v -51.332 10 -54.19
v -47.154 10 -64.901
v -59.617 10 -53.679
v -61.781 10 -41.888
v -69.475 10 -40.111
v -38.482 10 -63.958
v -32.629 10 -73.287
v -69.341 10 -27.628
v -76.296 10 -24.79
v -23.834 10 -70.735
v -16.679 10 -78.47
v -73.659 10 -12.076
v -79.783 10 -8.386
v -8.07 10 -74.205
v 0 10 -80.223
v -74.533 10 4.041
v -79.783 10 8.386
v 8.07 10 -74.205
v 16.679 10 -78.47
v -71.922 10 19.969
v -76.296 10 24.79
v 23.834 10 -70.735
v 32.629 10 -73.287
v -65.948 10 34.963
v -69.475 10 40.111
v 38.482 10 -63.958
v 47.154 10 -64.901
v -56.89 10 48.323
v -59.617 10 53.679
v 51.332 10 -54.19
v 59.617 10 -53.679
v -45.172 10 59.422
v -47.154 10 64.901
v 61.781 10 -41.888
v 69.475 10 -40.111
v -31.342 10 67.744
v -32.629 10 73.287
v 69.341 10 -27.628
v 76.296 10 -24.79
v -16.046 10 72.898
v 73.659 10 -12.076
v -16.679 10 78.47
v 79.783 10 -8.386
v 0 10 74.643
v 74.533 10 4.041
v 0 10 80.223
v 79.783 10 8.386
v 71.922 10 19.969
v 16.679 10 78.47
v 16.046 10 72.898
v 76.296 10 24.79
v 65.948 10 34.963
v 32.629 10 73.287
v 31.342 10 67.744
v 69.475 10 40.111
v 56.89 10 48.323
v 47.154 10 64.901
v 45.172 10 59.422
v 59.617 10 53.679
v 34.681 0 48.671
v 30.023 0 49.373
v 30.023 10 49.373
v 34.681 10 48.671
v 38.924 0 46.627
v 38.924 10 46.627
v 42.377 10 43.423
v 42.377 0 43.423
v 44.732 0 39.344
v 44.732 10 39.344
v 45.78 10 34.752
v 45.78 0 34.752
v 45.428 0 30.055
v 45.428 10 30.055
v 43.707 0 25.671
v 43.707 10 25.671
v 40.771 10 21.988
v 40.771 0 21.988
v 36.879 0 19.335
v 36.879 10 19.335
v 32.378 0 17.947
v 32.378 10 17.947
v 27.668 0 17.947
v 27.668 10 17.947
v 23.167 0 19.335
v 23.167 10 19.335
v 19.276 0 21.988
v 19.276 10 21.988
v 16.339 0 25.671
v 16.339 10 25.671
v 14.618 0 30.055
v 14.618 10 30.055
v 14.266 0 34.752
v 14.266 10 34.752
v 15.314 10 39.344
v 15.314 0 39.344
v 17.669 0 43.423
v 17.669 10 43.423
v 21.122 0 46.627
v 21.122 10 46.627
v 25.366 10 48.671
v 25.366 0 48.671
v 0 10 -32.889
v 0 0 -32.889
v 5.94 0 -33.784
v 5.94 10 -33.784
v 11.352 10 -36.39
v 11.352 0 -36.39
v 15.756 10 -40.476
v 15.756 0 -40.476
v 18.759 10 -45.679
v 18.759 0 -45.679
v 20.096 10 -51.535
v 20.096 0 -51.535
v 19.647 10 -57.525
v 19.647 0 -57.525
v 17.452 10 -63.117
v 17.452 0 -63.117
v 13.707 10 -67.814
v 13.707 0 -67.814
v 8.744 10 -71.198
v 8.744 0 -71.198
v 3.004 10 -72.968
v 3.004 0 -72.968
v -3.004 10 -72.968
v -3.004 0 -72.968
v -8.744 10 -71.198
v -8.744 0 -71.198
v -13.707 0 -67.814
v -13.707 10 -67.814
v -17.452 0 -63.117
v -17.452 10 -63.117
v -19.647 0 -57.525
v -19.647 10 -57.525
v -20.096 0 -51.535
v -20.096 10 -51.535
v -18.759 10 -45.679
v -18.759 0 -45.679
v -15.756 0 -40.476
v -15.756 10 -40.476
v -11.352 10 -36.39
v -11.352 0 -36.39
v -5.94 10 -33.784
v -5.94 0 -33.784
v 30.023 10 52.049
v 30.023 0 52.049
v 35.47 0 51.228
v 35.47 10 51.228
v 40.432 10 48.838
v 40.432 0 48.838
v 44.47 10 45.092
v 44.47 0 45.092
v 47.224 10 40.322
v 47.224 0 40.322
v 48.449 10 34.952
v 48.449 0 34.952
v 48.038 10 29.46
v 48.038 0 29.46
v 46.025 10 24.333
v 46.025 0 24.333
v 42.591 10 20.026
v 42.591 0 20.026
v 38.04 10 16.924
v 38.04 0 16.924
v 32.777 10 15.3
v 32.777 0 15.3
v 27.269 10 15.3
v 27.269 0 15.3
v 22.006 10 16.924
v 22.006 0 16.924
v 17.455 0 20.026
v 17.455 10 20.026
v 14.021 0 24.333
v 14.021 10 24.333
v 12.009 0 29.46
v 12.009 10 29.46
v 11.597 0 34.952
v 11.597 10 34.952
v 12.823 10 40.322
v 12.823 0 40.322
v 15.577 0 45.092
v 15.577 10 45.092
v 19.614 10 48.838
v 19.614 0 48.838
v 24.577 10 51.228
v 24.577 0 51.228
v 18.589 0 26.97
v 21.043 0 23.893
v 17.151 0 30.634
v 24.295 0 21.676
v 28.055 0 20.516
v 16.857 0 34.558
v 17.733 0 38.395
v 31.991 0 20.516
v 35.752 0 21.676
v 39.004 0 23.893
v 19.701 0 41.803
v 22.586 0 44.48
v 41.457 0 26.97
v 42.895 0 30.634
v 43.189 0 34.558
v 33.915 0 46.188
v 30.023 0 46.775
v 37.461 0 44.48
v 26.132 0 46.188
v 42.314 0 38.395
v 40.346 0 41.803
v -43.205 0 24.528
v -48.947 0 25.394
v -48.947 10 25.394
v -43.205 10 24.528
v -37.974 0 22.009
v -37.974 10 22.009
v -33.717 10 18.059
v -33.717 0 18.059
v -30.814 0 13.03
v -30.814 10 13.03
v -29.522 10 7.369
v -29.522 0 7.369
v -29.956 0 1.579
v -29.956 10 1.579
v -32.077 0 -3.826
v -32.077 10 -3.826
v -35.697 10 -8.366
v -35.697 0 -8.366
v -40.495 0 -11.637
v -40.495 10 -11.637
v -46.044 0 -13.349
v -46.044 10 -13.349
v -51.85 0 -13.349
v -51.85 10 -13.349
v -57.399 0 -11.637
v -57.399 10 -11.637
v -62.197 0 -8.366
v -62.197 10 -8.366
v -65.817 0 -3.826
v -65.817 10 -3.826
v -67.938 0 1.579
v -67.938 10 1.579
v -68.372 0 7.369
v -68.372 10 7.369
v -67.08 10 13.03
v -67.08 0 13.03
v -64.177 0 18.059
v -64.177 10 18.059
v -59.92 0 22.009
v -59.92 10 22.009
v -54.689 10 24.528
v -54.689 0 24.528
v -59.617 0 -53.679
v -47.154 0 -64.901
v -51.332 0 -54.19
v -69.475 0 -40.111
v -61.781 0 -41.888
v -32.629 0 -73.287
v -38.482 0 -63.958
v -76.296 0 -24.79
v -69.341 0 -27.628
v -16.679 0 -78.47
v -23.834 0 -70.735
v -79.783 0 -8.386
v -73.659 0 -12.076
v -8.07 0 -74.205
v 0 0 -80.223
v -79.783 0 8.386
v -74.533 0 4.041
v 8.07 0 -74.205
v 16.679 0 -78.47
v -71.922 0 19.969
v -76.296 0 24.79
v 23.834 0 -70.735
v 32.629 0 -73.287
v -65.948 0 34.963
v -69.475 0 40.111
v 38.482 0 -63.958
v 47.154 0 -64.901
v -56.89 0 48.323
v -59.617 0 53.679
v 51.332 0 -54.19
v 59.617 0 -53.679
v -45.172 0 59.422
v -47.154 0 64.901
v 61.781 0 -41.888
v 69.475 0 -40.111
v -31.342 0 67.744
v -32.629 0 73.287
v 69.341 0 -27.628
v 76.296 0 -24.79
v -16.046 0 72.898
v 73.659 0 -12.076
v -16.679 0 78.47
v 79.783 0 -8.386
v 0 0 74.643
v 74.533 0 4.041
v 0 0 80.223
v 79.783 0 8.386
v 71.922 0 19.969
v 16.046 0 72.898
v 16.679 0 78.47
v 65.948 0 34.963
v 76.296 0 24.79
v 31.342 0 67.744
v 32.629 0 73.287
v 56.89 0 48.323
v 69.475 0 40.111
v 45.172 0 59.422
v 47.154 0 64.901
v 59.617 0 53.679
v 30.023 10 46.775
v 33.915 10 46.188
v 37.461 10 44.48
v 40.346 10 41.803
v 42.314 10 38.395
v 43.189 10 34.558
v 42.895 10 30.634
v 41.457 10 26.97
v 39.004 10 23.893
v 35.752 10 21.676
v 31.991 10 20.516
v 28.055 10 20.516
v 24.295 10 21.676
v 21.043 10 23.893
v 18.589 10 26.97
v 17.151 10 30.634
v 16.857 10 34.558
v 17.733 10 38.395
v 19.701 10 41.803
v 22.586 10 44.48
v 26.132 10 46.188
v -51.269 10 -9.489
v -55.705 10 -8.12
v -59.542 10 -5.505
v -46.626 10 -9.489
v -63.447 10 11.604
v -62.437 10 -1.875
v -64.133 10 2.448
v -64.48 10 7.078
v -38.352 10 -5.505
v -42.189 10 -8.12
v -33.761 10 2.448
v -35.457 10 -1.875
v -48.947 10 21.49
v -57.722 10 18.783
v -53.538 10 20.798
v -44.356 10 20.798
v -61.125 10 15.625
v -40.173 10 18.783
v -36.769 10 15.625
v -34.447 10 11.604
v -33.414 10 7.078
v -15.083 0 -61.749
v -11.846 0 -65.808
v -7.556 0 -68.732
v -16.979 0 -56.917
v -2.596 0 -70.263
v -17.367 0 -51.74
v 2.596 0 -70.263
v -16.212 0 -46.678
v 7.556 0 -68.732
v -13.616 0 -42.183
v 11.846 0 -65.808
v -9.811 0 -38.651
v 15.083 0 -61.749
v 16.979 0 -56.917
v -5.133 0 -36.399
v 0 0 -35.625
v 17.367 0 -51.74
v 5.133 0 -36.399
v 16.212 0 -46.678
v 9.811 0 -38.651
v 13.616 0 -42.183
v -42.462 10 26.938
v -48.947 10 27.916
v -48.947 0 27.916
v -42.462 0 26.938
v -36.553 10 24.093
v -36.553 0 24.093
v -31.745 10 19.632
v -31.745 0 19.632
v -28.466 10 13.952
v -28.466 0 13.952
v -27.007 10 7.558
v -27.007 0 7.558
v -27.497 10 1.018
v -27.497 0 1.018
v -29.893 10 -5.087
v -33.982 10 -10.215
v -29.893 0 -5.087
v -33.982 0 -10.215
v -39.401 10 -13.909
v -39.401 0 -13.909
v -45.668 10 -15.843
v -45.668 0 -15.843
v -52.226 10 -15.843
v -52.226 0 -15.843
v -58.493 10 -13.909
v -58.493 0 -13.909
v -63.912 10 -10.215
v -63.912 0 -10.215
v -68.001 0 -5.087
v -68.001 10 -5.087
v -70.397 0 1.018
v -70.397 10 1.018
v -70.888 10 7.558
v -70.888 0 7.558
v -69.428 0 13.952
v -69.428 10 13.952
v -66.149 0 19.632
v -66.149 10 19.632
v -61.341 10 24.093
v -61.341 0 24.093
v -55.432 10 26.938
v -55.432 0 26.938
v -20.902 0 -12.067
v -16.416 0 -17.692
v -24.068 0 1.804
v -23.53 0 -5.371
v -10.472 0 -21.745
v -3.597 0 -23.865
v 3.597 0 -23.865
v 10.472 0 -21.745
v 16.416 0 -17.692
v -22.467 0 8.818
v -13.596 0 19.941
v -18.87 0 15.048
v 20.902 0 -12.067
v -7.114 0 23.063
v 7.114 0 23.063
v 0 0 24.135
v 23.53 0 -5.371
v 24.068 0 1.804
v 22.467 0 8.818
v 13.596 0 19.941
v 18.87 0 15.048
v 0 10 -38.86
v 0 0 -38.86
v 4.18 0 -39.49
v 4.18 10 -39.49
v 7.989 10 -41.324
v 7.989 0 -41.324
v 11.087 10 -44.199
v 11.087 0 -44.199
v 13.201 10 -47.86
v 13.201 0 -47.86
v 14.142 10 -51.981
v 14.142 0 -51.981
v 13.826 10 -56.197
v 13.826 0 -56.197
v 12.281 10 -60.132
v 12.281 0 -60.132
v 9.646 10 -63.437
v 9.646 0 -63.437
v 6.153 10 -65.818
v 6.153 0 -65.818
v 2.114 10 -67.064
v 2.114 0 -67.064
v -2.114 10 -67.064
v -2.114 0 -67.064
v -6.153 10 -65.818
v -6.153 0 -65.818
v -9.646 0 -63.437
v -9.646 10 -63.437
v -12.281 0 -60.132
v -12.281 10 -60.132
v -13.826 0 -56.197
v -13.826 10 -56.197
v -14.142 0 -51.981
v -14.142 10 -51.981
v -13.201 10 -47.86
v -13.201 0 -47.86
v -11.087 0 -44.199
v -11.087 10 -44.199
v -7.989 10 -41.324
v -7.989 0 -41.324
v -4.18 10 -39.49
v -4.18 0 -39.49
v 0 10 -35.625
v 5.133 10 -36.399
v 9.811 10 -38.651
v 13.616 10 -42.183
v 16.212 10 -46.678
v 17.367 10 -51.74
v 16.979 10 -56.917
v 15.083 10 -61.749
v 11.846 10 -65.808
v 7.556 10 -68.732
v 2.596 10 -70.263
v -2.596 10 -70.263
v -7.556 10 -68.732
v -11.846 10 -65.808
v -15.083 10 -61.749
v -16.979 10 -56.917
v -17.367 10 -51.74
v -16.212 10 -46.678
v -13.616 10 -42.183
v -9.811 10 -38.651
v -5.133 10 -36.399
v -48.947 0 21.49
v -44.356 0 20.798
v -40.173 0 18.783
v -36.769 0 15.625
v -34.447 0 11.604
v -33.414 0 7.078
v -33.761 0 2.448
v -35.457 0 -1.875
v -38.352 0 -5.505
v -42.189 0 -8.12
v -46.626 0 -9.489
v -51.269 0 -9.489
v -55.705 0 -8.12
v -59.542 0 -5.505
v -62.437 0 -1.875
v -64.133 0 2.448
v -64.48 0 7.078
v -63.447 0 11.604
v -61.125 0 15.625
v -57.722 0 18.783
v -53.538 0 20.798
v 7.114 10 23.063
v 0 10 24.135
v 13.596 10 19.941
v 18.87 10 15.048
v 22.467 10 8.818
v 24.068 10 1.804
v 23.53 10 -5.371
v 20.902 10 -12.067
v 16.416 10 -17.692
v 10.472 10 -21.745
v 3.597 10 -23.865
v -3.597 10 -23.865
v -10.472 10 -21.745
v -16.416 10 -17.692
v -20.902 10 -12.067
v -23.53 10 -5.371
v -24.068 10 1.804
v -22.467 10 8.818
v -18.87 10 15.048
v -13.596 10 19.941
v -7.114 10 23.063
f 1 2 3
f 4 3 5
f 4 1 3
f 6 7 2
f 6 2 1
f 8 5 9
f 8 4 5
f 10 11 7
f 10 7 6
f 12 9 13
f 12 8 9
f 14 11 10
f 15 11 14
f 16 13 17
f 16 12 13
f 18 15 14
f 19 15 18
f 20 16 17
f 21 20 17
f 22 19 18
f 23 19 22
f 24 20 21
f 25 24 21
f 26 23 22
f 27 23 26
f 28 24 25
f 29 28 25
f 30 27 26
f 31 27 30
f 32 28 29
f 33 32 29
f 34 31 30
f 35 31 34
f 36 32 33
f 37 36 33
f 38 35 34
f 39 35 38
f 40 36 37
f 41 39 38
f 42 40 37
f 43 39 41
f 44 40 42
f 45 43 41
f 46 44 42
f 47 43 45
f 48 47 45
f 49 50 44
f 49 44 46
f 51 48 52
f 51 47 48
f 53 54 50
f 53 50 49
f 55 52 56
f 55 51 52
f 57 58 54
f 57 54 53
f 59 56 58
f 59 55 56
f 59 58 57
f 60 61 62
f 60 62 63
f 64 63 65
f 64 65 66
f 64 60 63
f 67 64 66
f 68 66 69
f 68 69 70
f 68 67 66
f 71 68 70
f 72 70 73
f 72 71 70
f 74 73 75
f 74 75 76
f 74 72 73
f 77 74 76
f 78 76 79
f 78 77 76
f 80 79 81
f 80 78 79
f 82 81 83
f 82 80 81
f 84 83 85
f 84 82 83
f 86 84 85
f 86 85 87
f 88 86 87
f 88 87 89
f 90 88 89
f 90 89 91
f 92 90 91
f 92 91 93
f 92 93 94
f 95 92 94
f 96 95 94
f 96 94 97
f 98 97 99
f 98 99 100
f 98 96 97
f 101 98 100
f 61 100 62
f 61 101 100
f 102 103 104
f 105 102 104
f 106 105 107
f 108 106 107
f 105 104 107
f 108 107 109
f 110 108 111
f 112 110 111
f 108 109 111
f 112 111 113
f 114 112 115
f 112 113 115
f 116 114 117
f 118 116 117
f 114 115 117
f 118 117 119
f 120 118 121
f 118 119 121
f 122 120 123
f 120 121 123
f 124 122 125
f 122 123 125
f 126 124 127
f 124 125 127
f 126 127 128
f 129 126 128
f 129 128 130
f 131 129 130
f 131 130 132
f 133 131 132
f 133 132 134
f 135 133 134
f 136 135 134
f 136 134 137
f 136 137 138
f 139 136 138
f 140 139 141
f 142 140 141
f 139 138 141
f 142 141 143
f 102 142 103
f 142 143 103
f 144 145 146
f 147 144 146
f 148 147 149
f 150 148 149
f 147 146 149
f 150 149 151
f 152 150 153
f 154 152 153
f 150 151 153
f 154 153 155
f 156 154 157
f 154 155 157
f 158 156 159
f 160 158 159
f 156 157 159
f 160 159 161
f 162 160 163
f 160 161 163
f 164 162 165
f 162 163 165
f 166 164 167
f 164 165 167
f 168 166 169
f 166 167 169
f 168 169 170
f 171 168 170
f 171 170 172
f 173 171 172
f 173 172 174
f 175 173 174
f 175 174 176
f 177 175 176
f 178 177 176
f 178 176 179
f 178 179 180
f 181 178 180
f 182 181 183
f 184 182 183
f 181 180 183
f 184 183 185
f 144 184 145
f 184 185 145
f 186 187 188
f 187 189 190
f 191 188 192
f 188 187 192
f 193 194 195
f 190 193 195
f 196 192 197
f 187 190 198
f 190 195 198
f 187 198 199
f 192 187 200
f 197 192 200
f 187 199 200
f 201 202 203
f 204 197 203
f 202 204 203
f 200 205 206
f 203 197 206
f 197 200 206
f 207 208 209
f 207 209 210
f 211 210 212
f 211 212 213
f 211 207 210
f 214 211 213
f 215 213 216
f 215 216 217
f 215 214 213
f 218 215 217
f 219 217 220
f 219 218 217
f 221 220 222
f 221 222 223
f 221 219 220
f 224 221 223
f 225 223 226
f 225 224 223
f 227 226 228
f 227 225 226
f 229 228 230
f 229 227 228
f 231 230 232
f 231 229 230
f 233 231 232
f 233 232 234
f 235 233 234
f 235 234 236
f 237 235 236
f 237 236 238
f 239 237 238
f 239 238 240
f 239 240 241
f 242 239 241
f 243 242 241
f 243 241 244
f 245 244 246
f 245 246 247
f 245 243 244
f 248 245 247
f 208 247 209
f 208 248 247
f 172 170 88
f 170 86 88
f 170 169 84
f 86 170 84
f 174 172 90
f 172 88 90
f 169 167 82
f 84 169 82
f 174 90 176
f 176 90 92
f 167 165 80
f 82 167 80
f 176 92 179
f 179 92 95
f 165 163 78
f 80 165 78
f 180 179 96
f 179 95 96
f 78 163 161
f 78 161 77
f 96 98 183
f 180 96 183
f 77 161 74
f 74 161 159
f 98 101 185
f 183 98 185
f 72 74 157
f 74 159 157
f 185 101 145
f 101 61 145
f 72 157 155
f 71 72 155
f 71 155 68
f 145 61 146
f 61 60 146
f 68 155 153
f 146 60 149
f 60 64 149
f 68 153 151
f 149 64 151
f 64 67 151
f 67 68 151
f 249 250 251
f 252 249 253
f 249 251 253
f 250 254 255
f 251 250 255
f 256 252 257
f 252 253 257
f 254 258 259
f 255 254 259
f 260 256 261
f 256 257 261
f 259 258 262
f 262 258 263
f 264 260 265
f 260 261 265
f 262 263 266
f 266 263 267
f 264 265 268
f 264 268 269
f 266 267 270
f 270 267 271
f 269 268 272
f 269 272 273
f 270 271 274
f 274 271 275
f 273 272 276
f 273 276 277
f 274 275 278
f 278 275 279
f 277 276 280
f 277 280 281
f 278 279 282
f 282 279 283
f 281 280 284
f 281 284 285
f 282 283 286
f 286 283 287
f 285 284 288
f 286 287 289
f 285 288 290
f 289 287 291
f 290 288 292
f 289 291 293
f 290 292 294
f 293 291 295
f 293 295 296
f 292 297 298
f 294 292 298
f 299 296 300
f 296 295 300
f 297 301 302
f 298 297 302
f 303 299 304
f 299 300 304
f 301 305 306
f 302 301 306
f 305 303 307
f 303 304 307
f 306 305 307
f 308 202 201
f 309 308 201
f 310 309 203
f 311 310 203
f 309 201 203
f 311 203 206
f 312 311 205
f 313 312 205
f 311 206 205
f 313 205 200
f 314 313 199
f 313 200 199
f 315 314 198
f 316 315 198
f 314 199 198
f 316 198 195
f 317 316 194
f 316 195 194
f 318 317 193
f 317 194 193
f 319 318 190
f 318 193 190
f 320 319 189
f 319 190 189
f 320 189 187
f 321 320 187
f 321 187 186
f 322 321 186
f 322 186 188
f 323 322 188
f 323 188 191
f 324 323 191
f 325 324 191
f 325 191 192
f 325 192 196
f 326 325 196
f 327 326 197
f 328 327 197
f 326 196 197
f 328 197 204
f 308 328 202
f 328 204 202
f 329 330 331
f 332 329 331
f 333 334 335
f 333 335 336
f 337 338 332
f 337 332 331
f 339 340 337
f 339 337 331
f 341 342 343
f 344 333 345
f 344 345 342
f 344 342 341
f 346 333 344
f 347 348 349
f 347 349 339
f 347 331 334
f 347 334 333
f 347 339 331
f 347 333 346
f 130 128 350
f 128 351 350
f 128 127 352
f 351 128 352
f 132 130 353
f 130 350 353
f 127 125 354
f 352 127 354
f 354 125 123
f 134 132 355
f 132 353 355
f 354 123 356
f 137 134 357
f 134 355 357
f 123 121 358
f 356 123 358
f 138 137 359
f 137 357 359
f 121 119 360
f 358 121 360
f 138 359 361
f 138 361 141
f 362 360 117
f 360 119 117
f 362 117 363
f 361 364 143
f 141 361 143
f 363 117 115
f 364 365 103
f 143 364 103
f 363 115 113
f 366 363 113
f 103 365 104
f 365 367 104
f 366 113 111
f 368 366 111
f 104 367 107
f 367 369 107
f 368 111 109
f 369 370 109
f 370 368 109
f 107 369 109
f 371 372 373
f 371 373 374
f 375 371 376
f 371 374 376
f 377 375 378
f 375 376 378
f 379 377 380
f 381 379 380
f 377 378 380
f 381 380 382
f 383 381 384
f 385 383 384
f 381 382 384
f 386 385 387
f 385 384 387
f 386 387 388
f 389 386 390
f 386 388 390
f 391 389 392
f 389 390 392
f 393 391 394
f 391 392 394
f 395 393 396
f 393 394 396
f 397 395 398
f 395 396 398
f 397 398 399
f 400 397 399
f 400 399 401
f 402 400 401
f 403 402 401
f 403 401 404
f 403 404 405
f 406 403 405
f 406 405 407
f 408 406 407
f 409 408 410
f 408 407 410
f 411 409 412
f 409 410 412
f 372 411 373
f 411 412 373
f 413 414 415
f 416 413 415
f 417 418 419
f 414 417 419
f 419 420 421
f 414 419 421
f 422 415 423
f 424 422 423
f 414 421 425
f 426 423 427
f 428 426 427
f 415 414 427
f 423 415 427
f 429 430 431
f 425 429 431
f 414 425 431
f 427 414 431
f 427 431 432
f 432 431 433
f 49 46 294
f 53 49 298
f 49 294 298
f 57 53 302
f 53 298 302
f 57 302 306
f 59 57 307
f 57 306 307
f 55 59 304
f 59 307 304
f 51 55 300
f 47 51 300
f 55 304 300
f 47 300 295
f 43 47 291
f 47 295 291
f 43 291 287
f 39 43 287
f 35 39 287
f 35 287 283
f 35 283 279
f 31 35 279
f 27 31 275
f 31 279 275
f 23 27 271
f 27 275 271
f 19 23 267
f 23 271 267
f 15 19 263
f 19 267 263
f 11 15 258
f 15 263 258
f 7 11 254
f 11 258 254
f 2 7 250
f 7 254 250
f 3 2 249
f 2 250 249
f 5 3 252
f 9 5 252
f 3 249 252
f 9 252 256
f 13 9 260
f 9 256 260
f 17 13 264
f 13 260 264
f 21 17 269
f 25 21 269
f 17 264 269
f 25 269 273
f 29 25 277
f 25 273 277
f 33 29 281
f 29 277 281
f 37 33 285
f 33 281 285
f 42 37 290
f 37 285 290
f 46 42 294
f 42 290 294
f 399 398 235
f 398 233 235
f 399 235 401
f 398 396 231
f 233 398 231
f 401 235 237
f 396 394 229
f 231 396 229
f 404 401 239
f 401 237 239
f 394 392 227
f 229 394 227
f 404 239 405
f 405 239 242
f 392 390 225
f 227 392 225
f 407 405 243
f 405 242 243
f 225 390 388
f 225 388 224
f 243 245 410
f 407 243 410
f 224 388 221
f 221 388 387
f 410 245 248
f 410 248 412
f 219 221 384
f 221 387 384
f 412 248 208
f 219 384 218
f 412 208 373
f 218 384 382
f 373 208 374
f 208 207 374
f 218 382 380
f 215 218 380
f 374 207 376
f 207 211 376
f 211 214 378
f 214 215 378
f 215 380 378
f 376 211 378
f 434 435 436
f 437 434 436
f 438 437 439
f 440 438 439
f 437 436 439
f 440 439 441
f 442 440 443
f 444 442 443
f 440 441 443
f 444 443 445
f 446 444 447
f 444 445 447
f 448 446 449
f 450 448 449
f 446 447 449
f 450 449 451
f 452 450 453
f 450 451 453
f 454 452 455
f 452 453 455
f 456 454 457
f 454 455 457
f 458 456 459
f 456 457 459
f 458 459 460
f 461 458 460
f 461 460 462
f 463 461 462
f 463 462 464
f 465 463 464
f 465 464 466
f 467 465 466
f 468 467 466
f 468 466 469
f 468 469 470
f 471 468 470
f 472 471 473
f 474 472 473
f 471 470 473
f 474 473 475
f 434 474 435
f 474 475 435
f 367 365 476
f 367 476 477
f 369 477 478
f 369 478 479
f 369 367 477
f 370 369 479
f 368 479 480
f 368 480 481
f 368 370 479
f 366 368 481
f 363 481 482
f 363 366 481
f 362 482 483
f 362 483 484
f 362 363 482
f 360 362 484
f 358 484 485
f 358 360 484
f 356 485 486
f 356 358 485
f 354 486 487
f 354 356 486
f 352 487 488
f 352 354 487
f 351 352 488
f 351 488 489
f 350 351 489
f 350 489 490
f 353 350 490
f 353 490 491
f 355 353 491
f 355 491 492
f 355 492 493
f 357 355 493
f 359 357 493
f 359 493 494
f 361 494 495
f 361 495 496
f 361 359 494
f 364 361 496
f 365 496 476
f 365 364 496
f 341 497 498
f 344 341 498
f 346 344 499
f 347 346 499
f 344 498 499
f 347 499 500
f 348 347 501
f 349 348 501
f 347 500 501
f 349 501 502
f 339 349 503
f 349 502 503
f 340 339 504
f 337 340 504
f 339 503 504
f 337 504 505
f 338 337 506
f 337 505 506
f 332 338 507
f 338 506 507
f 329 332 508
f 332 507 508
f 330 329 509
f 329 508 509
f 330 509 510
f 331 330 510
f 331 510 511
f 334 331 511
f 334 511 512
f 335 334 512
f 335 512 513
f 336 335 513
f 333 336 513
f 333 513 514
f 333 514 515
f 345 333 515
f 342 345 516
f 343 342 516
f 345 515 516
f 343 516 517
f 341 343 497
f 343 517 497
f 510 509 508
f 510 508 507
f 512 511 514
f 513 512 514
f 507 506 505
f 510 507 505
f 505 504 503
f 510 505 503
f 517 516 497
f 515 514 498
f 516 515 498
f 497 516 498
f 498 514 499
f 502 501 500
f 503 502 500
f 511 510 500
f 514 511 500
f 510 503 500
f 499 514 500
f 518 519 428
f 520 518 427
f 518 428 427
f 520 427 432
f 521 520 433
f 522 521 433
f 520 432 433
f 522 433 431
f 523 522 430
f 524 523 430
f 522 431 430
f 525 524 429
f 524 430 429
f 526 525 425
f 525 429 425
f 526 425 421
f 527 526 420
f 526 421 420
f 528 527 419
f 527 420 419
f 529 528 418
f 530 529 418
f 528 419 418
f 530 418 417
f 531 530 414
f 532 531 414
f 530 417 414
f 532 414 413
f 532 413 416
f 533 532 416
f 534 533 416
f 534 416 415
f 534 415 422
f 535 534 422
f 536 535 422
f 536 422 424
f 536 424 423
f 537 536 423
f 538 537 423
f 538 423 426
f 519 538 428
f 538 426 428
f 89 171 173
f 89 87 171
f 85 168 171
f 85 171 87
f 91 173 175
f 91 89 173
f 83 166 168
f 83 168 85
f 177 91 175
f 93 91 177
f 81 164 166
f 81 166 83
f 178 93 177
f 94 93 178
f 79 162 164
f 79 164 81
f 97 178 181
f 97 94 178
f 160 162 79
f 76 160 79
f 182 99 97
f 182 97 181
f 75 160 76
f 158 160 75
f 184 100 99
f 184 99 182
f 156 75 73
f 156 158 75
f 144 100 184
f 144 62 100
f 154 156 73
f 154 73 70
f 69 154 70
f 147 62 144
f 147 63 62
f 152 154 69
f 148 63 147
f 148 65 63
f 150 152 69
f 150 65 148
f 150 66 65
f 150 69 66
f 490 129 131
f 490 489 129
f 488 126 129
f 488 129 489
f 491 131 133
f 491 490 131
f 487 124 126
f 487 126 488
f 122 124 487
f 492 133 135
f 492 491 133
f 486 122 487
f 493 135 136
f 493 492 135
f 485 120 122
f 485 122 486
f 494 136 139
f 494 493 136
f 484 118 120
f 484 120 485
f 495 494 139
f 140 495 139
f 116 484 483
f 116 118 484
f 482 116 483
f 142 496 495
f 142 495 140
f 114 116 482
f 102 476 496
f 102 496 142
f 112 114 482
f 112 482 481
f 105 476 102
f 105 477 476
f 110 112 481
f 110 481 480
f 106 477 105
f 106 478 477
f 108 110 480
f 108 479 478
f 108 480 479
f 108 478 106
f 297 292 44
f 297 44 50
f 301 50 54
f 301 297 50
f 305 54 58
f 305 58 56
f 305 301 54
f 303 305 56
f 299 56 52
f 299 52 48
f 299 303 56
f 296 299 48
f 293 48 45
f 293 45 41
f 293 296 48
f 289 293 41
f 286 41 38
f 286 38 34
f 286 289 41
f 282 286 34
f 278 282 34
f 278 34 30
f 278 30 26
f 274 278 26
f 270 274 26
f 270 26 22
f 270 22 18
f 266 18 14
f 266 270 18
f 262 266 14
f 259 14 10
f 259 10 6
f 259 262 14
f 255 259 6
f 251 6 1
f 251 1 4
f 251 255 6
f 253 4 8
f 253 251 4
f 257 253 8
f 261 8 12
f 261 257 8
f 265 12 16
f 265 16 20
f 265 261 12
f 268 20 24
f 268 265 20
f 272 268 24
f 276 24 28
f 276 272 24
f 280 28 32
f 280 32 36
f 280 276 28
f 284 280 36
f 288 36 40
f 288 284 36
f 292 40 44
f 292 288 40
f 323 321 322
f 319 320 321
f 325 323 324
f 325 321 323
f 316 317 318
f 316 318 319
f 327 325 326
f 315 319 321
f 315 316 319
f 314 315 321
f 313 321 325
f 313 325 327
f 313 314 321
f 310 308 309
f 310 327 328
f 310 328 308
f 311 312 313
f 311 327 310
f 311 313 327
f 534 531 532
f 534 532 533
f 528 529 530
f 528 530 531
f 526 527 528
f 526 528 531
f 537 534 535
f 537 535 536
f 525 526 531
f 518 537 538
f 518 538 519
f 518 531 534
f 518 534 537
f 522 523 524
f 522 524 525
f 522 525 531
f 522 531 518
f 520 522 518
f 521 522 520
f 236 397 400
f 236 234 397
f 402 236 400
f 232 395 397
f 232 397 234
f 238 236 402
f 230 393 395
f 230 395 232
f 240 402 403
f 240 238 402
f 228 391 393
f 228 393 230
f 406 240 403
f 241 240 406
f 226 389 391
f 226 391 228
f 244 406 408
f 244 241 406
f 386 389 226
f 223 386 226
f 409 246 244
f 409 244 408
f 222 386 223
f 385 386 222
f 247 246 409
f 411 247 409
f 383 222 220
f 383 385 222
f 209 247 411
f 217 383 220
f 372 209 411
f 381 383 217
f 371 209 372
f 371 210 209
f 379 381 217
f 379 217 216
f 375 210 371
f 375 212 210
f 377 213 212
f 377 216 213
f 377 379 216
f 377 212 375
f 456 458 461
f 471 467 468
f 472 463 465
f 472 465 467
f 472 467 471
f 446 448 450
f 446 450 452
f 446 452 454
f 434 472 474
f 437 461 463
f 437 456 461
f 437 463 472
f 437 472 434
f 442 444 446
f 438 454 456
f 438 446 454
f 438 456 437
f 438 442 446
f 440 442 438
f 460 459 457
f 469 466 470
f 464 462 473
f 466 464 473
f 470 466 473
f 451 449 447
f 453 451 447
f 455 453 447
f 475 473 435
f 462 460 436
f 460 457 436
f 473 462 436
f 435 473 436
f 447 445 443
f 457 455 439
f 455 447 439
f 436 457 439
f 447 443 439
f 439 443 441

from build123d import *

# Parameters (mm, degrees)
SKETCH1_R             = 80.222638377
SKETCH1_R_2           = 74.642628995
BOSS_EXTRUDE1_DEPTH   = 10
SKETCH1_R_3           = 24.134997674
BOSS_EXTRUDE1_2_DEPTH = 10
SKETCH1_R_4           = 15.576395098
BOSS_EXTRUDE1_3_DEPTH = 10
SKETCH1_R_5           = 22.002030522
SKETCH1_R_6           = 19.479844266
BOSS_EXTRUDE1_4_DEPTH = 10
SKETCH1_R_7           = 14.181155463
BOSS_EXTRUDE1_5_DEPTH = 10
SKETCH1_R_8           = 20.152350334
SKETCH1_R_9           = 17.415889713
BOSS_EXTRUDE1_6_DEPTH = 10
SKETCH1_R_10          = 13.203023979
BOSS_EXTRUDE1_7_DEPTH = 10
SKETCH1_R_11          = 18.477604897
SKETCH1_R_12          = 15.801149957
BOSS_EXTRUDE1_8_DEPTH = 10


with BuildPart() as part:
    # Sketch1 → Boss-Extrude1 (new body)
    with BuildSketch(Plane(origin=(0, 0, 0), x_dir=(1, 0, 0), z_dir=(0, 1, 0))):
        with Locations(Location((0, 0, 0), (0, 0, 270))):
            Circle(SKETCH1_R)
        with Locations(Location((0, 0, 0), (0, 0, 270))):
            Circle(SKETCH1_R_2, mode=Mode.SUBTRACT)
    extrude(amount=BOSS_EXTRUDE1_DEPTH)


with BuildPart() as body_2:
    # Sketch1 → Boss-Extrude1 2 (new body)
    with BuildSketch(Plane(origin=(0, 0, 0), x_dir=(1, 0, 0), z_dir=(0, 1, 0))):
        with Locations(Location((0, 0, 0), (0, 0, 270))):
            Circle(SKETCH1_R_3)
    extrude(amount=BOSS_EXTRUDE1_2_DEPTH)


with BuildPart() as body_3:
    # Sketch1 → Boss-Extrude1 3 (new body)
    with BuildSketch(Plane(origin=(0, 0, 0), x_dir=(1, 0, 0), z_dir=(0, 1, 0))):
        with Locations(Location((-48.947047963, -5.913676799, 0), (0, 0, 270))):
            Circle(SKETCH1_R_4)
    extrude(amount=BOSS_EXTRUDE1_3_DEPTH)


with BuildPart() as body_4:
    # Sketch1 → Boss-Extrude1 4 (new body)
    with BuildSketch(Plane(origin=(0, 0, 0), x_dir=(1, 0, 0), z_dir=(0, 1, 0))):
        with Locations(Location((-48.947047963, -5.913676799, 0), (0, 0, 270))):
            Circle(SKETCH1_R_5)
        with Locations(Location((-48.947047963, -5.913676799, 0), (0, 0, 270))):
            Circle(SKETCH1_R_6, mode=Mode.SUBTRACT)
    extrude(amount=BOSS_EXTRUDE1_4_DEPTH)


with BuildPart() as body_5:
    # Sketch1 → Boss-Extrude1 5 (new body)
    with BuildSketch(Plane(origin=(0, 0, 0), x_dir=(1, 0, 0), z_dir=(0, 1, 0))):
        with Locations(Location((0, 53.041131901, 0), (0, 0, 270))):
            Circle(SKETCH1_R_7)
    extrude(amount=BOSS_EXTRUDE1_5_DEPTH)


with BuildPart() as body_6:
    # Sketch1 → Boss-Extrude1 6 (new body)
    with BuildSketch(Plane(origin=(0, 0, 0), x_dir=(1, 0, 0), z_dir=(0, 1, 0))):
        with Locations(Location((0, 53.041131901, 0), (0, 0, 270))):
            Circle(SKETCH1_R_8)
        with Locations(Location((0, 53.041131901, 0), (0, 0, 270))):
            Circle(SKETCH1_R_9, mode=Mode.SUBTRACT)
    extrude(amount=BOSS_EXTRUDE1_6_DEPTH)


with BuildPart() as body_7:
    # Sketch1 → Boss-Extrude1 7 (new body)
    with BuildSketch(Plane(origin=(0, 0, 0), x_dir=(1, 0, 0), z_dir=(0, 1, 0))):
        with Locations(Location((30.023282208, -33.571488287, 0), (0, 0, 270))):
            Circle(SKETCH1_R_10)
    extrude(amount=BOSS_EXTRUDE1_7_DEPTH)


with BuildPart() as body_8:
    # Sketch1 → Boss-Extrude1 8 (new body)
    with BuildSketch(Plane(origin=(0, 0, 0), x_dir=(1, 0, 0), z_dir=(0, 1, 0))):
        with Locations(Location((30.023282208, -33.571488287, 0), (0, 0, 270))):
            Circle(SKETCH1_R_11)
        with Locations(Location((30.023282208, -33.571488287, 0), (0, 0, 270))):
            Circle(SKETCH1_R_12, mode=Mode.SUBTRACT)
    extrude(amount=BOSS_EXTRUDE1_8_DEPTH)


solid = Compound([part.part, body_2.part, body_3.part, body_4.part, body_5.part, body_6.part, body_7.part, body_8.part])
